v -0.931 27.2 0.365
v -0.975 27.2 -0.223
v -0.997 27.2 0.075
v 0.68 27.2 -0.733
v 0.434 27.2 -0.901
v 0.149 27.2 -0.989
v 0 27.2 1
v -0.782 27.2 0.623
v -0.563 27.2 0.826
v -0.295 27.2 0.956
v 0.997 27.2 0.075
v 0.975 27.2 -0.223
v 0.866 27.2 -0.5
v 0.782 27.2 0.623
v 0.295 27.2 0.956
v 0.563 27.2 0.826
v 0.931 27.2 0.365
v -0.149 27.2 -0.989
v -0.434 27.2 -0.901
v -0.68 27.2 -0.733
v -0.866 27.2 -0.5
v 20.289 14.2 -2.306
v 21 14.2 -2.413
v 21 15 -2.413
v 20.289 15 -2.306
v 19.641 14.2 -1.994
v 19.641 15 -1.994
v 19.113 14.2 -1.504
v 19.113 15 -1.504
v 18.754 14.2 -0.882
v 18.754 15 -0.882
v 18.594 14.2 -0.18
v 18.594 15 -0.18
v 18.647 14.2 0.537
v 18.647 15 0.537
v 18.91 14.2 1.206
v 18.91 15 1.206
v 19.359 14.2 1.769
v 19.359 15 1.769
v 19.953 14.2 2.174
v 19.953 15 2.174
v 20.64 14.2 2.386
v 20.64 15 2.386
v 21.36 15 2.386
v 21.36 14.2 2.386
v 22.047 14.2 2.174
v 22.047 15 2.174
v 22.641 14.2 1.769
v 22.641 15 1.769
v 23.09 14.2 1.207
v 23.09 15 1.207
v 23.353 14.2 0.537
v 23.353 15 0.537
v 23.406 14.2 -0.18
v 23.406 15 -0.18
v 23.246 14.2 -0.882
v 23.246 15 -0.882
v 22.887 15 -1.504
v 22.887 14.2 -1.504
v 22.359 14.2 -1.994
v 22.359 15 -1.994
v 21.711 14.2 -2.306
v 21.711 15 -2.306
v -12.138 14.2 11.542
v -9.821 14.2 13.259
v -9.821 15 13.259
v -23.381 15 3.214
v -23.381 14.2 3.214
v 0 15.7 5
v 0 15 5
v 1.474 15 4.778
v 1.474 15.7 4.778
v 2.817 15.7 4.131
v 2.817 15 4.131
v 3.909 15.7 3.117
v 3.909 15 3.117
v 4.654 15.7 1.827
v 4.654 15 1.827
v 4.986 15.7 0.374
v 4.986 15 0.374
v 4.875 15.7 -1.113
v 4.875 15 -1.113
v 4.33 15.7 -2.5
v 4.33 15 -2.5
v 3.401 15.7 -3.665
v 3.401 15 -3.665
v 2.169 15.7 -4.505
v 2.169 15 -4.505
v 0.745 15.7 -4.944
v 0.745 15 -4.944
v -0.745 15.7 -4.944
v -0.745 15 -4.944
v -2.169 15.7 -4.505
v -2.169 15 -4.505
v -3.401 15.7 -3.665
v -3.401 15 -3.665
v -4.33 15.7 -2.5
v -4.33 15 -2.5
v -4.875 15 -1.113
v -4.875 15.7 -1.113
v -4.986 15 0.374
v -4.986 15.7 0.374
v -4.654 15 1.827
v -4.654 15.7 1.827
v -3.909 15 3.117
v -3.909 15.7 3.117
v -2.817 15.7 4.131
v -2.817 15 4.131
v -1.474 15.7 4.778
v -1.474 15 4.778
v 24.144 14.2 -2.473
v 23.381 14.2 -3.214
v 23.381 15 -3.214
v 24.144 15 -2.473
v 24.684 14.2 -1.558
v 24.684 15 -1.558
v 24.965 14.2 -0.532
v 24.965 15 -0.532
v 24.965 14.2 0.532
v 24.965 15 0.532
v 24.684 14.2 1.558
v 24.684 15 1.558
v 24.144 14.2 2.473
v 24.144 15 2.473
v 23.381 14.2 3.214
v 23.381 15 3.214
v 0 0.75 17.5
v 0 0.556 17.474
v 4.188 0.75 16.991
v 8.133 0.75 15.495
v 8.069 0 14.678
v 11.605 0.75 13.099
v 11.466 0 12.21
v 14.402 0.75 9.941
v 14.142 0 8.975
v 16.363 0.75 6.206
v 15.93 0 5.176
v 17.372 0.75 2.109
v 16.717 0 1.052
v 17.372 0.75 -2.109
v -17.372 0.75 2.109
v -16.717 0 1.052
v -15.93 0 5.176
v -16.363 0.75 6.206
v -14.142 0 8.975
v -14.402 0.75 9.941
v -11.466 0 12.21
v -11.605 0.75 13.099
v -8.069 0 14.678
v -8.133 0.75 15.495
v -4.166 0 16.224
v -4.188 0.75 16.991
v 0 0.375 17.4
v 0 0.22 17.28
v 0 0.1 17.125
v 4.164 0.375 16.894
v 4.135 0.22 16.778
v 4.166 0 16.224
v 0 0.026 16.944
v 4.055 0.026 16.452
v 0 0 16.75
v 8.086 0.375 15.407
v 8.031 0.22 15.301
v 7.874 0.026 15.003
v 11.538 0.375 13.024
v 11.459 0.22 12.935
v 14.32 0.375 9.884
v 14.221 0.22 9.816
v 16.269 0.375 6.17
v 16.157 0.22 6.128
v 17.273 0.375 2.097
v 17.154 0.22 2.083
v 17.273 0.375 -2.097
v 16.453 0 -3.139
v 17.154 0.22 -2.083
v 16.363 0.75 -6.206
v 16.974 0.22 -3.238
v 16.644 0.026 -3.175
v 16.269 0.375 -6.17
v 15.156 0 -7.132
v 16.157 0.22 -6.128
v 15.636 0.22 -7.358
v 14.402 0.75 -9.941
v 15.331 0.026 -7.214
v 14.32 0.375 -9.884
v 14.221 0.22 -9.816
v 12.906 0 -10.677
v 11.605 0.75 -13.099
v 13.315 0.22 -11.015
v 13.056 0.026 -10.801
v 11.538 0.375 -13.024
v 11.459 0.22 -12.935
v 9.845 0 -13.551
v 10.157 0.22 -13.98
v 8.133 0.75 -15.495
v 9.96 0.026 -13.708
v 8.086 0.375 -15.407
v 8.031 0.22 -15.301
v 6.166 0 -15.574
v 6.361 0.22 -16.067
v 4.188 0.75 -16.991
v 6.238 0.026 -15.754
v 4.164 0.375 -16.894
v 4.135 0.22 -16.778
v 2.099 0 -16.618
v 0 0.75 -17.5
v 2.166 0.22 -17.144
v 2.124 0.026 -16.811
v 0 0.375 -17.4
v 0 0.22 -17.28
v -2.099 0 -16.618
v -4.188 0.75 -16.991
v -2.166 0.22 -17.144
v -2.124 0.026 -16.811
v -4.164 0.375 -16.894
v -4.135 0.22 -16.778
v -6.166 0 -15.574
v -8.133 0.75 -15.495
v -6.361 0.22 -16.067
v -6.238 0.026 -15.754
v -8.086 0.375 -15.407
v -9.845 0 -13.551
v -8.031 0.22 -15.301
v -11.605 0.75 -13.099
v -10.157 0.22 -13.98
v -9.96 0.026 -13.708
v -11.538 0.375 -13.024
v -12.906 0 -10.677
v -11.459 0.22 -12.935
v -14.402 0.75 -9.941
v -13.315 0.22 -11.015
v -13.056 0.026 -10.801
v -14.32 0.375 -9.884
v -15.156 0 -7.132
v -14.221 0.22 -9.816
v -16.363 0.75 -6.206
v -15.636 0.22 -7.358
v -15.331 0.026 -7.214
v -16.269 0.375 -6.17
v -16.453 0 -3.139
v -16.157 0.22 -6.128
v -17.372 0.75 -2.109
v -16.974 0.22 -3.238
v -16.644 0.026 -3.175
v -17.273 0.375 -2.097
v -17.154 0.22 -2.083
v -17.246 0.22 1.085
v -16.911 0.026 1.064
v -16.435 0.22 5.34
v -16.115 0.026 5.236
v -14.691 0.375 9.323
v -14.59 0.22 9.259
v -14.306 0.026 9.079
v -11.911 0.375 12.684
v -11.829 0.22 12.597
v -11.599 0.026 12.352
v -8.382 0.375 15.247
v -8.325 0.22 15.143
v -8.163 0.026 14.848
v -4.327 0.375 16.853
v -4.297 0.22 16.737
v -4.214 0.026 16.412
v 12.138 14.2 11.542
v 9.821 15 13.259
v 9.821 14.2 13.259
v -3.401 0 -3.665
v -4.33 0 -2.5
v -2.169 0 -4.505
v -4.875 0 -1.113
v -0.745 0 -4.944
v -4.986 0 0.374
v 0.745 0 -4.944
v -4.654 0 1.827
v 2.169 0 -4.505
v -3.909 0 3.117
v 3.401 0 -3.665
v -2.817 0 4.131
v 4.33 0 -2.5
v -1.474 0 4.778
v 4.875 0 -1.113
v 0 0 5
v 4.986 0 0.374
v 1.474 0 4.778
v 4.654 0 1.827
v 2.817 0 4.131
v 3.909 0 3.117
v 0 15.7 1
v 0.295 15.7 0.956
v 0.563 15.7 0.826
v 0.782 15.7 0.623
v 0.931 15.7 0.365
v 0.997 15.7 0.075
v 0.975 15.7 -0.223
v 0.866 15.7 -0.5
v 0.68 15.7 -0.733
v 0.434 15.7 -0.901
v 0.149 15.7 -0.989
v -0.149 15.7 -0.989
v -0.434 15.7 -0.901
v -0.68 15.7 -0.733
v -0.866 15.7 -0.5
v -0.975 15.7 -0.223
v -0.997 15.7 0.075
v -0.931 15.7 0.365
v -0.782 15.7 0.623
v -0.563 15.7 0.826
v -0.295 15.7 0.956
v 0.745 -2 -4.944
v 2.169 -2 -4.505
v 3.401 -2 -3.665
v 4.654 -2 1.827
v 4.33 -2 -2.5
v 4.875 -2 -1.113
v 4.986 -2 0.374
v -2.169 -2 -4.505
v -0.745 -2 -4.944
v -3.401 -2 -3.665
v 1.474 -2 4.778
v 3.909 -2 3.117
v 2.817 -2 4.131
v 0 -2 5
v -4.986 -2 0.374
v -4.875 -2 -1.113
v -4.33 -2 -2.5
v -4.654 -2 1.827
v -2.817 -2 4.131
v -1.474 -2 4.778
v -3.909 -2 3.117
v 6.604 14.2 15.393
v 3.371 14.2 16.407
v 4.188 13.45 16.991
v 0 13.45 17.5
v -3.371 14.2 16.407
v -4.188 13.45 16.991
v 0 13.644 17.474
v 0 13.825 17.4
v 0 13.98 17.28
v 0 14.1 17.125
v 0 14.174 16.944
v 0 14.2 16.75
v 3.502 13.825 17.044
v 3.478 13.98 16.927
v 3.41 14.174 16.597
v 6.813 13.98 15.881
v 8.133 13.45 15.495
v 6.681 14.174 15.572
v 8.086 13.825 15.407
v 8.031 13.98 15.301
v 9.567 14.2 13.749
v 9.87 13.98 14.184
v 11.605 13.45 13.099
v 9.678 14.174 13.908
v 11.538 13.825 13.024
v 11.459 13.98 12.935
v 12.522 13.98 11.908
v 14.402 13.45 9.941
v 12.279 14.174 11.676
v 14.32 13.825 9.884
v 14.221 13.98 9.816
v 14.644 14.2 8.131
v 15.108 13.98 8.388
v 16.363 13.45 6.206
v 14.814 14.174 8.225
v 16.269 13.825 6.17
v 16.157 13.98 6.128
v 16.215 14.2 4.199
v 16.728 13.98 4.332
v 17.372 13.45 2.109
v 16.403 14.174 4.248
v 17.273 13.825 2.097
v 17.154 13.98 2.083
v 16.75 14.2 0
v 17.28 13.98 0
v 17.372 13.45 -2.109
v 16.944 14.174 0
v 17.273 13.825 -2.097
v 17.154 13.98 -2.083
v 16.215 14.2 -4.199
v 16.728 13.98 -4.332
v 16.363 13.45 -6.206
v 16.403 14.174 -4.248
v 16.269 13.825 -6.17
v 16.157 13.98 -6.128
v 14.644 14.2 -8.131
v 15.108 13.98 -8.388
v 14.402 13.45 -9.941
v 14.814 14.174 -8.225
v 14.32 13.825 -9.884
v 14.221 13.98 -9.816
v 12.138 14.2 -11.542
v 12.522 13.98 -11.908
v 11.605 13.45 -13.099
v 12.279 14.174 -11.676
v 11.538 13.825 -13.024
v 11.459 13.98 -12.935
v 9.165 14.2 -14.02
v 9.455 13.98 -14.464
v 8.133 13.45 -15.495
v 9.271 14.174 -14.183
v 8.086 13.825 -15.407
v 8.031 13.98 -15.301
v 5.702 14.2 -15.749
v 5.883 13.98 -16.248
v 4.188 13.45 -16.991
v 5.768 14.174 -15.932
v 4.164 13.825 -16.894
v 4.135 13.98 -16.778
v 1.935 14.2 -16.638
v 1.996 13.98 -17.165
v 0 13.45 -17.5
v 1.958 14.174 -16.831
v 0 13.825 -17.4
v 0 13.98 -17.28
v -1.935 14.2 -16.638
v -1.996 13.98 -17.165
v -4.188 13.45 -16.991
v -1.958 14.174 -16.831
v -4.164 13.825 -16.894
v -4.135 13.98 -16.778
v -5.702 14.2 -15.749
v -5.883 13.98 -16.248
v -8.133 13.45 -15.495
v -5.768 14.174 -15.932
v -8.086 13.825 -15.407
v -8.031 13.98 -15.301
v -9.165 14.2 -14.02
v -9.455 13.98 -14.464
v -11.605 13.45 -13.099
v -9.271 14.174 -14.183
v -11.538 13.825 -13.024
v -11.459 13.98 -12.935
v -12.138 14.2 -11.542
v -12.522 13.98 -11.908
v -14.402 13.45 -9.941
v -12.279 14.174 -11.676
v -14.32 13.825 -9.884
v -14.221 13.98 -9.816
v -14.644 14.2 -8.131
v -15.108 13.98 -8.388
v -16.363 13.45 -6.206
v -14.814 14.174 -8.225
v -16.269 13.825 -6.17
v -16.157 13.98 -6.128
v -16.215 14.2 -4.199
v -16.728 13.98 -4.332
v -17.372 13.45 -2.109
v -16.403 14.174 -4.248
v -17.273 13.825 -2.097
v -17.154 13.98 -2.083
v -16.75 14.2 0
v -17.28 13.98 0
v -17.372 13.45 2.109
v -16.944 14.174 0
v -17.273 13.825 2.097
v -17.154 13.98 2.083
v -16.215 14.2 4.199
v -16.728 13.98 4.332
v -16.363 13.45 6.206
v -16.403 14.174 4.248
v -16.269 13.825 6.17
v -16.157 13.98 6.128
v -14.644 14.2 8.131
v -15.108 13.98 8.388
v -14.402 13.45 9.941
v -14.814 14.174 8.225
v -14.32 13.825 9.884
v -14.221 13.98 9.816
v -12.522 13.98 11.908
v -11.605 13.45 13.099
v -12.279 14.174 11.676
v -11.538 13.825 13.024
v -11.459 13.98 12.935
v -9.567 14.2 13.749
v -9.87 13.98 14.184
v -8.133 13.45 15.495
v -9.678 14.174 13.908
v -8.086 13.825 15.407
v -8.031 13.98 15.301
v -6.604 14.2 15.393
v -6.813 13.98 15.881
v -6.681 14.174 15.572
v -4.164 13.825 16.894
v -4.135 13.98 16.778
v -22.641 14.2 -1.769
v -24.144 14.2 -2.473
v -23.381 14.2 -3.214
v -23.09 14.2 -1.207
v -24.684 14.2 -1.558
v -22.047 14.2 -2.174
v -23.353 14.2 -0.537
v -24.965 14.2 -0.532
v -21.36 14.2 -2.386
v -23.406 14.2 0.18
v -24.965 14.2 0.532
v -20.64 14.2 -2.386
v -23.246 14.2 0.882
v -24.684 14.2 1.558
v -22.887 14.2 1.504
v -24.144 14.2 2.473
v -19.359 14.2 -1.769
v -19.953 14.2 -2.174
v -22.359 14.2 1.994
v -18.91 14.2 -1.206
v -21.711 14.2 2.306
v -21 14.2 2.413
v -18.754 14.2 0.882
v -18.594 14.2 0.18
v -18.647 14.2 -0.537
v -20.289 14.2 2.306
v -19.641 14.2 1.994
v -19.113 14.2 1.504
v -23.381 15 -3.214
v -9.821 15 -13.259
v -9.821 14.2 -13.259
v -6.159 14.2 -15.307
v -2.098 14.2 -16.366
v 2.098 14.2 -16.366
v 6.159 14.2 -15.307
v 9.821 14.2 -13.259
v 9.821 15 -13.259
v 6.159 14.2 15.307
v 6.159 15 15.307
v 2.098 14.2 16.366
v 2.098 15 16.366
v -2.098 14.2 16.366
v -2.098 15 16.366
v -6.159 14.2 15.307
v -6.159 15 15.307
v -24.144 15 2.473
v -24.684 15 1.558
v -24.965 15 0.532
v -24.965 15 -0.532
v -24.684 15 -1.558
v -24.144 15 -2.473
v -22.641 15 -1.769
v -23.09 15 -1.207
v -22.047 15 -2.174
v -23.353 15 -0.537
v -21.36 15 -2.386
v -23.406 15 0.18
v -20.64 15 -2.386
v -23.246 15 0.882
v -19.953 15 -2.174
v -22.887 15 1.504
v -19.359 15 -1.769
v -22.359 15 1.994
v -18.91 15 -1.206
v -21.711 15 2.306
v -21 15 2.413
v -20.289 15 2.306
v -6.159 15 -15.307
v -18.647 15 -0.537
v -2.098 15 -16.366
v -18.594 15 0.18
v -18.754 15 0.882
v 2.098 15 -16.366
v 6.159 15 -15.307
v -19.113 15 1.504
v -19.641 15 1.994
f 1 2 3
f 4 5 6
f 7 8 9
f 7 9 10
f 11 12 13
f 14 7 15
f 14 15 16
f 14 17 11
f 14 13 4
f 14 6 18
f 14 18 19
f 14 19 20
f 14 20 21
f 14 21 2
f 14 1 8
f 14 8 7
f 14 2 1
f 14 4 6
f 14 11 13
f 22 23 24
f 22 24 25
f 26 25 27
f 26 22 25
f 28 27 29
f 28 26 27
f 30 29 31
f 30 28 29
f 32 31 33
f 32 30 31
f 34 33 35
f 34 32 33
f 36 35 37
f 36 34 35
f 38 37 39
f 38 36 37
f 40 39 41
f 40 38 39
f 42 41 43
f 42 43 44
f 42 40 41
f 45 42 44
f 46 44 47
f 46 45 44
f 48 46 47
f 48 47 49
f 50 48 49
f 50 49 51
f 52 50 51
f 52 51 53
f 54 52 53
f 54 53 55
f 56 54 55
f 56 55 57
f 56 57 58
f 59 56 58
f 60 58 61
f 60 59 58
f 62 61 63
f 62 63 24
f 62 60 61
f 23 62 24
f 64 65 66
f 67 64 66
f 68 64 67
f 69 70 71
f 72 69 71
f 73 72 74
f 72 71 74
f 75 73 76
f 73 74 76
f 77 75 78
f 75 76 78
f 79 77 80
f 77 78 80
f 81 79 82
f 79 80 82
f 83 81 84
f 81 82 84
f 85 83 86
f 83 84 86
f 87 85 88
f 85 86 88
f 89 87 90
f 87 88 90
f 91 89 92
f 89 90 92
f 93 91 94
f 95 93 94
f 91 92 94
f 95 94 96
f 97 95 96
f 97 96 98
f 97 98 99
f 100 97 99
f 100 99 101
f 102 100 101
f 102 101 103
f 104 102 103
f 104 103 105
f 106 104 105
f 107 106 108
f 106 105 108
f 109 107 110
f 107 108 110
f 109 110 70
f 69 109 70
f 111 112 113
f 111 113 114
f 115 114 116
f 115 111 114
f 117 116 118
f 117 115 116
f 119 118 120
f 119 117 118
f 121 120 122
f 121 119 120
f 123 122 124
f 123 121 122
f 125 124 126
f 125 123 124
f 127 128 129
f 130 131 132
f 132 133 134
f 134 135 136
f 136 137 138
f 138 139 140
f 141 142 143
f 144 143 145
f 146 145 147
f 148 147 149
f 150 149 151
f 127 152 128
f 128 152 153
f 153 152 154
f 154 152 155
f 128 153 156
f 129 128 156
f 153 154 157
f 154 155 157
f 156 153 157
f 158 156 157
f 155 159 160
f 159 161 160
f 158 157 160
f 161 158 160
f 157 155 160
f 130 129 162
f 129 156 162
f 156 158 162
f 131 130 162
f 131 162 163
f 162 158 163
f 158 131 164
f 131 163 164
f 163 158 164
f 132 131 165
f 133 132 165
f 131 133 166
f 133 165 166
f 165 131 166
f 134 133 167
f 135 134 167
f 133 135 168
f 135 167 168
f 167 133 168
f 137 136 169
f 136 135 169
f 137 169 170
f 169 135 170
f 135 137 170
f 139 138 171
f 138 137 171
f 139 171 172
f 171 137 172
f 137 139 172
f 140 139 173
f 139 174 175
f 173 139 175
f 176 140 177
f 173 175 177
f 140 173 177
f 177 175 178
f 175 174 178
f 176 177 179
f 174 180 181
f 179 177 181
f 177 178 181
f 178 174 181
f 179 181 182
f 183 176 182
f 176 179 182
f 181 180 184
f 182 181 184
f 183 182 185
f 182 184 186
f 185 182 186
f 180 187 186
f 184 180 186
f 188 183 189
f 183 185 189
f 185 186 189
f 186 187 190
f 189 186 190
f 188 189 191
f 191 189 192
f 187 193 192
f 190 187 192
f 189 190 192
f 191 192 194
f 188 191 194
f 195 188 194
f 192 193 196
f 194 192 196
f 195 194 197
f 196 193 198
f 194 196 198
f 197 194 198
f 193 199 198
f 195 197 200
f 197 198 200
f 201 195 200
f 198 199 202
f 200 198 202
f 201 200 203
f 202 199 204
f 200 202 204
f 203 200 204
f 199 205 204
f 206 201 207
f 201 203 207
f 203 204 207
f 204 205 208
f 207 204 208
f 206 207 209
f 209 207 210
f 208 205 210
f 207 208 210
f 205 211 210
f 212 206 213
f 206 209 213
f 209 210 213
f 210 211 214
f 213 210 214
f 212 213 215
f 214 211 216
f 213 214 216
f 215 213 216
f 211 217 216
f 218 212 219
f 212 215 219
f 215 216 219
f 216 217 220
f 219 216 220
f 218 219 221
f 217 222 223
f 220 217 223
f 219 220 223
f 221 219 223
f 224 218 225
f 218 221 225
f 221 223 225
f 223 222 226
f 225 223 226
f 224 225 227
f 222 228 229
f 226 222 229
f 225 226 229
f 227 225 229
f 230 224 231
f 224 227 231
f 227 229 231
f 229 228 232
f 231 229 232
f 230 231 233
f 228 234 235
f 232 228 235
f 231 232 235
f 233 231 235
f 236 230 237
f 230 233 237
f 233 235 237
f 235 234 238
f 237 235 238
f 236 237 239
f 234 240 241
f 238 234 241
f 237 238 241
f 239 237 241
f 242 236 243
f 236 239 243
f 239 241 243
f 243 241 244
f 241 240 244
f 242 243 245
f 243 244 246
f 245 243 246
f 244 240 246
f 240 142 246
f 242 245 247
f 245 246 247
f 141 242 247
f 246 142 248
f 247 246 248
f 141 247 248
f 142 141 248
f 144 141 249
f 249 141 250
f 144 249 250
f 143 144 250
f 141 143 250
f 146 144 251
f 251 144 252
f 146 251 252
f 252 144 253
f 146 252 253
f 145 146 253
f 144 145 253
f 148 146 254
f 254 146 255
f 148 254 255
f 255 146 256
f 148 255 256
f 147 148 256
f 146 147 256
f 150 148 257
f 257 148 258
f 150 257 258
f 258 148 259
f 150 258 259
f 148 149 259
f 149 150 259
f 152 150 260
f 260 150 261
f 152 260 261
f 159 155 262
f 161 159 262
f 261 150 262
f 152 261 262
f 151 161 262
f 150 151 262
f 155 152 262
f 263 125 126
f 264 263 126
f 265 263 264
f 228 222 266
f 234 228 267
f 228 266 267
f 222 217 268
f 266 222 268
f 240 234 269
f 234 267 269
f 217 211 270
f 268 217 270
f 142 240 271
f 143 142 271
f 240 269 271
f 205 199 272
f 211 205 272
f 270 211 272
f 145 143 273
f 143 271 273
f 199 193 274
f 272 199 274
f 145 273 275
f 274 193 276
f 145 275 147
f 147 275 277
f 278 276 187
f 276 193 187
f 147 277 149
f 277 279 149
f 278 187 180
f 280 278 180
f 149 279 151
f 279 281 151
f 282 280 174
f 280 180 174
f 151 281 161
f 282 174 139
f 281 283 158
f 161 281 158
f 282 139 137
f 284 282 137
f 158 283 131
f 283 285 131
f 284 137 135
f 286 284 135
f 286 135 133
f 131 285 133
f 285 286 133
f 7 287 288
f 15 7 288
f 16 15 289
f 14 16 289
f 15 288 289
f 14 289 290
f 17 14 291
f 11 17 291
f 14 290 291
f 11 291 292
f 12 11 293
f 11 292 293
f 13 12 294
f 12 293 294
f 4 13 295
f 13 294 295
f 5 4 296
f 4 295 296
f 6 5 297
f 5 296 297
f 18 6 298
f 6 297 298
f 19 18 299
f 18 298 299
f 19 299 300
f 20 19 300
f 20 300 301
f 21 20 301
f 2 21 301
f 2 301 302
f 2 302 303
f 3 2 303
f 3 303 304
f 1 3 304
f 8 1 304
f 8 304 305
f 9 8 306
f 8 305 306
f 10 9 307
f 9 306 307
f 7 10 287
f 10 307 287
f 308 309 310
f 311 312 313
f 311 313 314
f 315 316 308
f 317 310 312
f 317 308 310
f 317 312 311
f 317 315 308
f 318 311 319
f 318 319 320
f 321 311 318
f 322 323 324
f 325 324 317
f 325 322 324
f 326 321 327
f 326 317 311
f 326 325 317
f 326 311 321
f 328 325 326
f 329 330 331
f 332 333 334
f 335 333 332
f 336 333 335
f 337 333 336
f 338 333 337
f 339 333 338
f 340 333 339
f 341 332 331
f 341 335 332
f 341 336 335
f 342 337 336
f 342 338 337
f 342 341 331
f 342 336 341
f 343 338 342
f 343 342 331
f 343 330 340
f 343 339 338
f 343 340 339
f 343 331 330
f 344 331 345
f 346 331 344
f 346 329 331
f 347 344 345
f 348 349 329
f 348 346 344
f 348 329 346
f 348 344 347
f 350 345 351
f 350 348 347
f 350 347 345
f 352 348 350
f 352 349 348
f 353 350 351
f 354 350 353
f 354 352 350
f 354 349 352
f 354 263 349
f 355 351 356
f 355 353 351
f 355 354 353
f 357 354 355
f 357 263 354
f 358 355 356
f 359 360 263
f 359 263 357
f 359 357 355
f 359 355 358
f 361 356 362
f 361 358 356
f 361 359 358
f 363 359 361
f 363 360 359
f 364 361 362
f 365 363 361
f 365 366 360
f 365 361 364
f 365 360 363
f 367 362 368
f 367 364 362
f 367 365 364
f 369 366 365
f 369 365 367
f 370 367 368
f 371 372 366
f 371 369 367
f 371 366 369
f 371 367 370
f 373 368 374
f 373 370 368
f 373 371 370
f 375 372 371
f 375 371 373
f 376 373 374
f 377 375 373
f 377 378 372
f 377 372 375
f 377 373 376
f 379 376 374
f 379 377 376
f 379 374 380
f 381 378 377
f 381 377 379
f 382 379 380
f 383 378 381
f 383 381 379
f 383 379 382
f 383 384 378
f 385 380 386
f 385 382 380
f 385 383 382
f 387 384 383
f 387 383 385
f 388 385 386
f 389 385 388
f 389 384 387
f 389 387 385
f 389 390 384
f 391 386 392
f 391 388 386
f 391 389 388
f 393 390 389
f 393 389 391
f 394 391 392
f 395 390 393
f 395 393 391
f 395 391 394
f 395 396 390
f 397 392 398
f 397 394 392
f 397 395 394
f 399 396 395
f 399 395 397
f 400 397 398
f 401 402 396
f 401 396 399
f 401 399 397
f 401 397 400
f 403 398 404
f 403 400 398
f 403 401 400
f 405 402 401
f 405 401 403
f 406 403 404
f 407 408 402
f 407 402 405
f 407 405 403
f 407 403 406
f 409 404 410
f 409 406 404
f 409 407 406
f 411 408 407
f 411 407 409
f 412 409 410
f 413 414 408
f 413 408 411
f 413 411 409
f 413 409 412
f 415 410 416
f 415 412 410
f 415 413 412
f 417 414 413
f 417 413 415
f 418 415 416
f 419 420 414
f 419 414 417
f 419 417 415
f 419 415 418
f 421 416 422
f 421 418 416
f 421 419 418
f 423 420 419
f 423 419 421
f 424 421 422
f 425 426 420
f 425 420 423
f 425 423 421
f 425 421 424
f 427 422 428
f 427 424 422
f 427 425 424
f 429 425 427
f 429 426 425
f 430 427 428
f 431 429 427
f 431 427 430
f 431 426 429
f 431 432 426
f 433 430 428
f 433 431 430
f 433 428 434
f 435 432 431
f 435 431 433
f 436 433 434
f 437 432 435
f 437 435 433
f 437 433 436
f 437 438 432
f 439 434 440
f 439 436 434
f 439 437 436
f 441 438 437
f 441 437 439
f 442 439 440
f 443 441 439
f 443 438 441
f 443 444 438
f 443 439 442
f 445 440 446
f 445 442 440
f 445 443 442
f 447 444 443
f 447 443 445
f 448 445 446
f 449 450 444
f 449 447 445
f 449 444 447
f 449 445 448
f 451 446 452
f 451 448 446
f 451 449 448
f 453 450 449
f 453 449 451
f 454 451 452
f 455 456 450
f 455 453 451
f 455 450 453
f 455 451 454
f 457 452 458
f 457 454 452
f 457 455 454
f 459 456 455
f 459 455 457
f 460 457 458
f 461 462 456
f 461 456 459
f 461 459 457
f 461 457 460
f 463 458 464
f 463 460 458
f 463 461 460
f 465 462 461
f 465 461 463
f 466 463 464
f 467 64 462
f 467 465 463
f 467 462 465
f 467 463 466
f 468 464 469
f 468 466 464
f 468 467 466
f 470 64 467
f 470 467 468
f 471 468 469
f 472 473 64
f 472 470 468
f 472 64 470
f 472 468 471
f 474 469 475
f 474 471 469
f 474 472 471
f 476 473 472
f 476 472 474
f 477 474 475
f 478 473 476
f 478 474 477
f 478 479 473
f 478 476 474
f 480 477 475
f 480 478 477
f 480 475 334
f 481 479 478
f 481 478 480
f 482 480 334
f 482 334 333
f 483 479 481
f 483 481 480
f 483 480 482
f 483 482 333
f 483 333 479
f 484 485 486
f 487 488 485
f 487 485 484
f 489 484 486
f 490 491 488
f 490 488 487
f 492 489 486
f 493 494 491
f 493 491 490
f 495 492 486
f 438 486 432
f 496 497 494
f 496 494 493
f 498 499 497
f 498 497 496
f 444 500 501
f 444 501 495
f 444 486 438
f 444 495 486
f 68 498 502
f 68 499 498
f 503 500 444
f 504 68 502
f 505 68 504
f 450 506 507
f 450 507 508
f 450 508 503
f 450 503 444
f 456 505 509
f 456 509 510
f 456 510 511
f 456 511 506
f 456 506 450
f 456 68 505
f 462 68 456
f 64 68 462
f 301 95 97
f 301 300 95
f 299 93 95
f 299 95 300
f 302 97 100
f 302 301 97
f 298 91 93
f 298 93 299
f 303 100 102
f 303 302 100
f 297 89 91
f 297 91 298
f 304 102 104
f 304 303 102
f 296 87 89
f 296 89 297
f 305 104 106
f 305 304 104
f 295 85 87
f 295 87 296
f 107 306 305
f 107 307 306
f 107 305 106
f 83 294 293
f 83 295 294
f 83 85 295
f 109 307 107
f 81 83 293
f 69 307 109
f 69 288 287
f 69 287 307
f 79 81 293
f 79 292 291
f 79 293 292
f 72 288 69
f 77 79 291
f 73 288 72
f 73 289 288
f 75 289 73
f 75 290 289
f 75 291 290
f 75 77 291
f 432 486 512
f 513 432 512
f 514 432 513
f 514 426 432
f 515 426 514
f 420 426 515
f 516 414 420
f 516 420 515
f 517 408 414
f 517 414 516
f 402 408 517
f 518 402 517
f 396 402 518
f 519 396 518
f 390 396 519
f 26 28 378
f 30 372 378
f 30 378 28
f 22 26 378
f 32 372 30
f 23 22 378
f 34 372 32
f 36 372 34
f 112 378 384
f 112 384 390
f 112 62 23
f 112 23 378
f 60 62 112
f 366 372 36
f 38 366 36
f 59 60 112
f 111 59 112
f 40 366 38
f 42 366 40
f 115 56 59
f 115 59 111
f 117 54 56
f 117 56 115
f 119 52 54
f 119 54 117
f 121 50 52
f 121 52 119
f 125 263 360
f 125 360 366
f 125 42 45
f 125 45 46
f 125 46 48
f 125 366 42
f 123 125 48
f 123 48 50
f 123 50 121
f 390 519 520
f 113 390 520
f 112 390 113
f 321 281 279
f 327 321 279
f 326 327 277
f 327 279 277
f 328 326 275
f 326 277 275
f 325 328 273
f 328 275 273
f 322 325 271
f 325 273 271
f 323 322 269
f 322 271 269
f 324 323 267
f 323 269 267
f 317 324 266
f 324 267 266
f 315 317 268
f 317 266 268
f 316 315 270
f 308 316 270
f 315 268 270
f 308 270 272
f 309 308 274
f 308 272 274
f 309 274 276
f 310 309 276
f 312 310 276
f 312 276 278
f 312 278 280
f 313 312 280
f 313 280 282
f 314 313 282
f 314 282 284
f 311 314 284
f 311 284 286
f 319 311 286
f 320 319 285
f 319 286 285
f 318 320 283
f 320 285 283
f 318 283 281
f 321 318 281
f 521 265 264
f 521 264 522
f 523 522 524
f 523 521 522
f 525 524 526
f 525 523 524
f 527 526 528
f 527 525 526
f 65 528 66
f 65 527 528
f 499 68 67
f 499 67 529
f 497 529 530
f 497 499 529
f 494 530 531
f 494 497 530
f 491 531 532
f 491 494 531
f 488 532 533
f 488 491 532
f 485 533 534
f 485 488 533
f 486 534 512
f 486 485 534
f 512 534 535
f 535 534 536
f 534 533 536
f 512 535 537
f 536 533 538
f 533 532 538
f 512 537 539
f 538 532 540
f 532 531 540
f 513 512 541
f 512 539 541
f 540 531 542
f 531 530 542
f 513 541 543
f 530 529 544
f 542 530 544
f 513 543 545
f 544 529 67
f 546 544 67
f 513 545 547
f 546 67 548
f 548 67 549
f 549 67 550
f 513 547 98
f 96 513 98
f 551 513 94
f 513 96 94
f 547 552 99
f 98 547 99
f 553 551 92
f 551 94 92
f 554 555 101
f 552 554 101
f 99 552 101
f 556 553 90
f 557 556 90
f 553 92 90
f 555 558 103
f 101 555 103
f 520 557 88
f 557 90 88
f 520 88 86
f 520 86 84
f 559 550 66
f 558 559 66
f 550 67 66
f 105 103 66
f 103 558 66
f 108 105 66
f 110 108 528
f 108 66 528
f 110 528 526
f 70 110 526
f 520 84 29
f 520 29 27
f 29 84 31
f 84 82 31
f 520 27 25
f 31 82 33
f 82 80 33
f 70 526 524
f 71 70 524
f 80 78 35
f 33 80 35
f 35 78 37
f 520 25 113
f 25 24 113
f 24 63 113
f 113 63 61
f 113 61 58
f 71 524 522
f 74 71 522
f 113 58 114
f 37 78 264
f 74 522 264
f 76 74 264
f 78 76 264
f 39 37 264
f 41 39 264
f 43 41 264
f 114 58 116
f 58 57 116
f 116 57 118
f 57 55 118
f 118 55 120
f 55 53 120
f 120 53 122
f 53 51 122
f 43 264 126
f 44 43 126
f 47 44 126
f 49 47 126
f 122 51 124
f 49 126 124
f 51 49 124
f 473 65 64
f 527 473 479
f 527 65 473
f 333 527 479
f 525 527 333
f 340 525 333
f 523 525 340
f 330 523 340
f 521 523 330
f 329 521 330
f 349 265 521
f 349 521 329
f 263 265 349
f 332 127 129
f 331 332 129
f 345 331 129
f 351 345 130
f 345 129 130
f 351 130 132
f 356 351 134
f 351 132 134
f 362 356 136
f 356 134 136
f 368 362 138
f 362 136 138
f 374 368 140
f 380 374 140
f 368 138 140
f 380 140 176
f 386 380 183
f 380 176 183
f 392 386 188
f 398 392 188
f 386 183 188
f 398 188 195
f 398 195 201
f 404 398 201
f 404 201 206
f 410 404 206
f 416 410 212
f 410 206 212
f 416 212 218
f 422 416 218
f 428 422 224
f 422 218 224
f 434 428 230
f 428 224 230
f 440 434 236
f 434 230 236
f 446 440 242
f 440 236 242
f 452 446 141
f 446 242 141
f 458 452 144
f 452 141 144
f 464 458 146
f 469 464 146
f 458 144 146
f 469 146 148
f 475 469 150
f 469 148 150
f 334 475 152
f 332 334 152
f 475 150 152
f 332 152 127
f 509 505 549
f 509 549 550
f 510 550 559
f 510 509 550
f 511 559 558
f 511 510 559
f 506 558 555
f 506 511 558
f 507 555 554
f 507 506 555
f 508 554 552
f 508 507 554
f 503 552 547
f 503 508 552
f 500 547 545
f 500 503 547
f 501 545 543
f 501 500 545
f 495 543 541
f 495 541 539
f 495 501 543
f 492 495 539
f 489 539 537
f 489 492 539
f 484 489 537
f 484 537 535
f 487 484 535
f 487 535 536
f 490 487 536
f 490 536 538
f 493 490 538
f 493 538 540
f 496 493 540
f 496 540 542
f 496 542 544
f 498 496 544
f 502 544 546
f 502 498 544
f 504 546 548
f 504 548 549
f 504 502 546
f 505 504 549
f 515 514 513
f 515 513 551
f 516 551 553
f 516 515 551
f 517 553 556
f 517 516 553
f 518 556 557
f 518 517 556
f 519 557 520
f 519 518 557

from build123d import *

# Parameters (mm, degrees)
SKETCH1_R      = 17.5
EXTRUDE1_DEPTH = 14.2
FILLET1_R      = 0.75
SKETCH2_R      = 2.413
EXTRUDE2_DEPTH = 0.8
SKETCH3_R      = 5
EXTRUDE3_DEPTH = 2
SKETCH4_R      = 5
EXTRUDE4_DEPTH = 0.7
SKETCH5_R      = 1
EXTRUDE5_DEPTH = 11.5


with BuildPart() as part:
    # Sketch1 → Extrude1 (new body)
    with BuildSketch(Plane(origin=(0, 0, 0), x_dir=(1, 0, 0), z_dir=(0, 1, 0))):
        with Locations(Location((0, 0, 0), (0, 0, 270))):  # turned: the seam where the file's is
            Circle(SKETCH1_R)
    extrude(amount=EXTRUDE1_DEPTH)

    # Fillet1
    fillet1_edges = [part.edges().sort_by_distance(p)[0] for p in [
        (0, 0, -17.5),
        (0, 14.2, -17.5),
    ]]
    fillet(fillet1_edges, radius=FILLET1_R)

    # Sketch2 → Extrude2 (add)
    with BuildSketch(Plane(origin=(0, 14.2, 0), x_dir=(-1, 0, 0), z_dir=(0, 1, 0))):
        with BuildLine():
            Line((23.380952381, -3.21419753), (9.821428571, -13.25856481))
            ThreePointArc((9.821428571, -13.25856481), (0, -16.5), (-9.821428571, -13.25856481))
            Line((-9.821428571, -13.25856481), (-23.380952381, -3.21419753))
            ThreePointArc((-23.380952381, -3.21419753), (-25, 0), (-23.380952381, 3.21419753))
            Line((-23.380952381, 3.21419753), (-9.821428571, 13.25856481))
            ThreePointArc((-9.821428571, 13.25856481), (0, 16.5), (9.821428571, 13.25856481))
            Line((9.821428571, 13.25856481), (23.380952381, 3.21419753))
            ThreePointArc((23.380952381, 3.21419753), (25, 0), (23.380952381, -3.21419753))
        make_face()
        with Locations(Location((21, 0, 0), (0, 0, 90))):  # turned: the seam where the file's is
            Circle(SKETCH2_R, mode=Mode.SUBTRACT)
        with Locations(Location((-21, 0, 0), (0, 0, 270))):  # turned: the seam where the file's is
            Circle(SKETCH2_R, mode=Mode.SUBTRACT)
    extrude(amount=EXTRUDE2_DEPTH)

    # Sketch3 → Extrude3 (add)
    with BuildSketch(Plane.XZ):
        with Locations(Location((0, 0, 0), (0, 0, 90))):  # turned: the seam where the file's is
            Circle(SKETCH3_R)
    extrude(amount=EXTRUDE3_DEPTH)

    # Sketch4 → Extrude4 (add)
    with BuildSketch(Plane(origin=(0, 15, 0), x_dir=(-1, 0, 0), z_dir=(0, 1, 0))):
        with Locations(Location((0, 0, 0), (0, 0, 90))):  # turned: the seam where the file's is
            Circle(SKETCH4_R)
    extrude(amount=EXTRUDE4_DEPTH)

    # Sketch5 → Extrude5 (add)
    with BuildSketch(Plane(origin=(0, 15.7, 0), x_dir=(-1, 0, 0), z_dir=(0, 1, 0))):
        with Locations(Location((0, 0, 0), (0, 0, 90))):  # turned: the seam where the file's is
            Circle(SKETCH5_R)
    extrude(amount=EXTRUDE5_DEPTH)


solid = part.part
